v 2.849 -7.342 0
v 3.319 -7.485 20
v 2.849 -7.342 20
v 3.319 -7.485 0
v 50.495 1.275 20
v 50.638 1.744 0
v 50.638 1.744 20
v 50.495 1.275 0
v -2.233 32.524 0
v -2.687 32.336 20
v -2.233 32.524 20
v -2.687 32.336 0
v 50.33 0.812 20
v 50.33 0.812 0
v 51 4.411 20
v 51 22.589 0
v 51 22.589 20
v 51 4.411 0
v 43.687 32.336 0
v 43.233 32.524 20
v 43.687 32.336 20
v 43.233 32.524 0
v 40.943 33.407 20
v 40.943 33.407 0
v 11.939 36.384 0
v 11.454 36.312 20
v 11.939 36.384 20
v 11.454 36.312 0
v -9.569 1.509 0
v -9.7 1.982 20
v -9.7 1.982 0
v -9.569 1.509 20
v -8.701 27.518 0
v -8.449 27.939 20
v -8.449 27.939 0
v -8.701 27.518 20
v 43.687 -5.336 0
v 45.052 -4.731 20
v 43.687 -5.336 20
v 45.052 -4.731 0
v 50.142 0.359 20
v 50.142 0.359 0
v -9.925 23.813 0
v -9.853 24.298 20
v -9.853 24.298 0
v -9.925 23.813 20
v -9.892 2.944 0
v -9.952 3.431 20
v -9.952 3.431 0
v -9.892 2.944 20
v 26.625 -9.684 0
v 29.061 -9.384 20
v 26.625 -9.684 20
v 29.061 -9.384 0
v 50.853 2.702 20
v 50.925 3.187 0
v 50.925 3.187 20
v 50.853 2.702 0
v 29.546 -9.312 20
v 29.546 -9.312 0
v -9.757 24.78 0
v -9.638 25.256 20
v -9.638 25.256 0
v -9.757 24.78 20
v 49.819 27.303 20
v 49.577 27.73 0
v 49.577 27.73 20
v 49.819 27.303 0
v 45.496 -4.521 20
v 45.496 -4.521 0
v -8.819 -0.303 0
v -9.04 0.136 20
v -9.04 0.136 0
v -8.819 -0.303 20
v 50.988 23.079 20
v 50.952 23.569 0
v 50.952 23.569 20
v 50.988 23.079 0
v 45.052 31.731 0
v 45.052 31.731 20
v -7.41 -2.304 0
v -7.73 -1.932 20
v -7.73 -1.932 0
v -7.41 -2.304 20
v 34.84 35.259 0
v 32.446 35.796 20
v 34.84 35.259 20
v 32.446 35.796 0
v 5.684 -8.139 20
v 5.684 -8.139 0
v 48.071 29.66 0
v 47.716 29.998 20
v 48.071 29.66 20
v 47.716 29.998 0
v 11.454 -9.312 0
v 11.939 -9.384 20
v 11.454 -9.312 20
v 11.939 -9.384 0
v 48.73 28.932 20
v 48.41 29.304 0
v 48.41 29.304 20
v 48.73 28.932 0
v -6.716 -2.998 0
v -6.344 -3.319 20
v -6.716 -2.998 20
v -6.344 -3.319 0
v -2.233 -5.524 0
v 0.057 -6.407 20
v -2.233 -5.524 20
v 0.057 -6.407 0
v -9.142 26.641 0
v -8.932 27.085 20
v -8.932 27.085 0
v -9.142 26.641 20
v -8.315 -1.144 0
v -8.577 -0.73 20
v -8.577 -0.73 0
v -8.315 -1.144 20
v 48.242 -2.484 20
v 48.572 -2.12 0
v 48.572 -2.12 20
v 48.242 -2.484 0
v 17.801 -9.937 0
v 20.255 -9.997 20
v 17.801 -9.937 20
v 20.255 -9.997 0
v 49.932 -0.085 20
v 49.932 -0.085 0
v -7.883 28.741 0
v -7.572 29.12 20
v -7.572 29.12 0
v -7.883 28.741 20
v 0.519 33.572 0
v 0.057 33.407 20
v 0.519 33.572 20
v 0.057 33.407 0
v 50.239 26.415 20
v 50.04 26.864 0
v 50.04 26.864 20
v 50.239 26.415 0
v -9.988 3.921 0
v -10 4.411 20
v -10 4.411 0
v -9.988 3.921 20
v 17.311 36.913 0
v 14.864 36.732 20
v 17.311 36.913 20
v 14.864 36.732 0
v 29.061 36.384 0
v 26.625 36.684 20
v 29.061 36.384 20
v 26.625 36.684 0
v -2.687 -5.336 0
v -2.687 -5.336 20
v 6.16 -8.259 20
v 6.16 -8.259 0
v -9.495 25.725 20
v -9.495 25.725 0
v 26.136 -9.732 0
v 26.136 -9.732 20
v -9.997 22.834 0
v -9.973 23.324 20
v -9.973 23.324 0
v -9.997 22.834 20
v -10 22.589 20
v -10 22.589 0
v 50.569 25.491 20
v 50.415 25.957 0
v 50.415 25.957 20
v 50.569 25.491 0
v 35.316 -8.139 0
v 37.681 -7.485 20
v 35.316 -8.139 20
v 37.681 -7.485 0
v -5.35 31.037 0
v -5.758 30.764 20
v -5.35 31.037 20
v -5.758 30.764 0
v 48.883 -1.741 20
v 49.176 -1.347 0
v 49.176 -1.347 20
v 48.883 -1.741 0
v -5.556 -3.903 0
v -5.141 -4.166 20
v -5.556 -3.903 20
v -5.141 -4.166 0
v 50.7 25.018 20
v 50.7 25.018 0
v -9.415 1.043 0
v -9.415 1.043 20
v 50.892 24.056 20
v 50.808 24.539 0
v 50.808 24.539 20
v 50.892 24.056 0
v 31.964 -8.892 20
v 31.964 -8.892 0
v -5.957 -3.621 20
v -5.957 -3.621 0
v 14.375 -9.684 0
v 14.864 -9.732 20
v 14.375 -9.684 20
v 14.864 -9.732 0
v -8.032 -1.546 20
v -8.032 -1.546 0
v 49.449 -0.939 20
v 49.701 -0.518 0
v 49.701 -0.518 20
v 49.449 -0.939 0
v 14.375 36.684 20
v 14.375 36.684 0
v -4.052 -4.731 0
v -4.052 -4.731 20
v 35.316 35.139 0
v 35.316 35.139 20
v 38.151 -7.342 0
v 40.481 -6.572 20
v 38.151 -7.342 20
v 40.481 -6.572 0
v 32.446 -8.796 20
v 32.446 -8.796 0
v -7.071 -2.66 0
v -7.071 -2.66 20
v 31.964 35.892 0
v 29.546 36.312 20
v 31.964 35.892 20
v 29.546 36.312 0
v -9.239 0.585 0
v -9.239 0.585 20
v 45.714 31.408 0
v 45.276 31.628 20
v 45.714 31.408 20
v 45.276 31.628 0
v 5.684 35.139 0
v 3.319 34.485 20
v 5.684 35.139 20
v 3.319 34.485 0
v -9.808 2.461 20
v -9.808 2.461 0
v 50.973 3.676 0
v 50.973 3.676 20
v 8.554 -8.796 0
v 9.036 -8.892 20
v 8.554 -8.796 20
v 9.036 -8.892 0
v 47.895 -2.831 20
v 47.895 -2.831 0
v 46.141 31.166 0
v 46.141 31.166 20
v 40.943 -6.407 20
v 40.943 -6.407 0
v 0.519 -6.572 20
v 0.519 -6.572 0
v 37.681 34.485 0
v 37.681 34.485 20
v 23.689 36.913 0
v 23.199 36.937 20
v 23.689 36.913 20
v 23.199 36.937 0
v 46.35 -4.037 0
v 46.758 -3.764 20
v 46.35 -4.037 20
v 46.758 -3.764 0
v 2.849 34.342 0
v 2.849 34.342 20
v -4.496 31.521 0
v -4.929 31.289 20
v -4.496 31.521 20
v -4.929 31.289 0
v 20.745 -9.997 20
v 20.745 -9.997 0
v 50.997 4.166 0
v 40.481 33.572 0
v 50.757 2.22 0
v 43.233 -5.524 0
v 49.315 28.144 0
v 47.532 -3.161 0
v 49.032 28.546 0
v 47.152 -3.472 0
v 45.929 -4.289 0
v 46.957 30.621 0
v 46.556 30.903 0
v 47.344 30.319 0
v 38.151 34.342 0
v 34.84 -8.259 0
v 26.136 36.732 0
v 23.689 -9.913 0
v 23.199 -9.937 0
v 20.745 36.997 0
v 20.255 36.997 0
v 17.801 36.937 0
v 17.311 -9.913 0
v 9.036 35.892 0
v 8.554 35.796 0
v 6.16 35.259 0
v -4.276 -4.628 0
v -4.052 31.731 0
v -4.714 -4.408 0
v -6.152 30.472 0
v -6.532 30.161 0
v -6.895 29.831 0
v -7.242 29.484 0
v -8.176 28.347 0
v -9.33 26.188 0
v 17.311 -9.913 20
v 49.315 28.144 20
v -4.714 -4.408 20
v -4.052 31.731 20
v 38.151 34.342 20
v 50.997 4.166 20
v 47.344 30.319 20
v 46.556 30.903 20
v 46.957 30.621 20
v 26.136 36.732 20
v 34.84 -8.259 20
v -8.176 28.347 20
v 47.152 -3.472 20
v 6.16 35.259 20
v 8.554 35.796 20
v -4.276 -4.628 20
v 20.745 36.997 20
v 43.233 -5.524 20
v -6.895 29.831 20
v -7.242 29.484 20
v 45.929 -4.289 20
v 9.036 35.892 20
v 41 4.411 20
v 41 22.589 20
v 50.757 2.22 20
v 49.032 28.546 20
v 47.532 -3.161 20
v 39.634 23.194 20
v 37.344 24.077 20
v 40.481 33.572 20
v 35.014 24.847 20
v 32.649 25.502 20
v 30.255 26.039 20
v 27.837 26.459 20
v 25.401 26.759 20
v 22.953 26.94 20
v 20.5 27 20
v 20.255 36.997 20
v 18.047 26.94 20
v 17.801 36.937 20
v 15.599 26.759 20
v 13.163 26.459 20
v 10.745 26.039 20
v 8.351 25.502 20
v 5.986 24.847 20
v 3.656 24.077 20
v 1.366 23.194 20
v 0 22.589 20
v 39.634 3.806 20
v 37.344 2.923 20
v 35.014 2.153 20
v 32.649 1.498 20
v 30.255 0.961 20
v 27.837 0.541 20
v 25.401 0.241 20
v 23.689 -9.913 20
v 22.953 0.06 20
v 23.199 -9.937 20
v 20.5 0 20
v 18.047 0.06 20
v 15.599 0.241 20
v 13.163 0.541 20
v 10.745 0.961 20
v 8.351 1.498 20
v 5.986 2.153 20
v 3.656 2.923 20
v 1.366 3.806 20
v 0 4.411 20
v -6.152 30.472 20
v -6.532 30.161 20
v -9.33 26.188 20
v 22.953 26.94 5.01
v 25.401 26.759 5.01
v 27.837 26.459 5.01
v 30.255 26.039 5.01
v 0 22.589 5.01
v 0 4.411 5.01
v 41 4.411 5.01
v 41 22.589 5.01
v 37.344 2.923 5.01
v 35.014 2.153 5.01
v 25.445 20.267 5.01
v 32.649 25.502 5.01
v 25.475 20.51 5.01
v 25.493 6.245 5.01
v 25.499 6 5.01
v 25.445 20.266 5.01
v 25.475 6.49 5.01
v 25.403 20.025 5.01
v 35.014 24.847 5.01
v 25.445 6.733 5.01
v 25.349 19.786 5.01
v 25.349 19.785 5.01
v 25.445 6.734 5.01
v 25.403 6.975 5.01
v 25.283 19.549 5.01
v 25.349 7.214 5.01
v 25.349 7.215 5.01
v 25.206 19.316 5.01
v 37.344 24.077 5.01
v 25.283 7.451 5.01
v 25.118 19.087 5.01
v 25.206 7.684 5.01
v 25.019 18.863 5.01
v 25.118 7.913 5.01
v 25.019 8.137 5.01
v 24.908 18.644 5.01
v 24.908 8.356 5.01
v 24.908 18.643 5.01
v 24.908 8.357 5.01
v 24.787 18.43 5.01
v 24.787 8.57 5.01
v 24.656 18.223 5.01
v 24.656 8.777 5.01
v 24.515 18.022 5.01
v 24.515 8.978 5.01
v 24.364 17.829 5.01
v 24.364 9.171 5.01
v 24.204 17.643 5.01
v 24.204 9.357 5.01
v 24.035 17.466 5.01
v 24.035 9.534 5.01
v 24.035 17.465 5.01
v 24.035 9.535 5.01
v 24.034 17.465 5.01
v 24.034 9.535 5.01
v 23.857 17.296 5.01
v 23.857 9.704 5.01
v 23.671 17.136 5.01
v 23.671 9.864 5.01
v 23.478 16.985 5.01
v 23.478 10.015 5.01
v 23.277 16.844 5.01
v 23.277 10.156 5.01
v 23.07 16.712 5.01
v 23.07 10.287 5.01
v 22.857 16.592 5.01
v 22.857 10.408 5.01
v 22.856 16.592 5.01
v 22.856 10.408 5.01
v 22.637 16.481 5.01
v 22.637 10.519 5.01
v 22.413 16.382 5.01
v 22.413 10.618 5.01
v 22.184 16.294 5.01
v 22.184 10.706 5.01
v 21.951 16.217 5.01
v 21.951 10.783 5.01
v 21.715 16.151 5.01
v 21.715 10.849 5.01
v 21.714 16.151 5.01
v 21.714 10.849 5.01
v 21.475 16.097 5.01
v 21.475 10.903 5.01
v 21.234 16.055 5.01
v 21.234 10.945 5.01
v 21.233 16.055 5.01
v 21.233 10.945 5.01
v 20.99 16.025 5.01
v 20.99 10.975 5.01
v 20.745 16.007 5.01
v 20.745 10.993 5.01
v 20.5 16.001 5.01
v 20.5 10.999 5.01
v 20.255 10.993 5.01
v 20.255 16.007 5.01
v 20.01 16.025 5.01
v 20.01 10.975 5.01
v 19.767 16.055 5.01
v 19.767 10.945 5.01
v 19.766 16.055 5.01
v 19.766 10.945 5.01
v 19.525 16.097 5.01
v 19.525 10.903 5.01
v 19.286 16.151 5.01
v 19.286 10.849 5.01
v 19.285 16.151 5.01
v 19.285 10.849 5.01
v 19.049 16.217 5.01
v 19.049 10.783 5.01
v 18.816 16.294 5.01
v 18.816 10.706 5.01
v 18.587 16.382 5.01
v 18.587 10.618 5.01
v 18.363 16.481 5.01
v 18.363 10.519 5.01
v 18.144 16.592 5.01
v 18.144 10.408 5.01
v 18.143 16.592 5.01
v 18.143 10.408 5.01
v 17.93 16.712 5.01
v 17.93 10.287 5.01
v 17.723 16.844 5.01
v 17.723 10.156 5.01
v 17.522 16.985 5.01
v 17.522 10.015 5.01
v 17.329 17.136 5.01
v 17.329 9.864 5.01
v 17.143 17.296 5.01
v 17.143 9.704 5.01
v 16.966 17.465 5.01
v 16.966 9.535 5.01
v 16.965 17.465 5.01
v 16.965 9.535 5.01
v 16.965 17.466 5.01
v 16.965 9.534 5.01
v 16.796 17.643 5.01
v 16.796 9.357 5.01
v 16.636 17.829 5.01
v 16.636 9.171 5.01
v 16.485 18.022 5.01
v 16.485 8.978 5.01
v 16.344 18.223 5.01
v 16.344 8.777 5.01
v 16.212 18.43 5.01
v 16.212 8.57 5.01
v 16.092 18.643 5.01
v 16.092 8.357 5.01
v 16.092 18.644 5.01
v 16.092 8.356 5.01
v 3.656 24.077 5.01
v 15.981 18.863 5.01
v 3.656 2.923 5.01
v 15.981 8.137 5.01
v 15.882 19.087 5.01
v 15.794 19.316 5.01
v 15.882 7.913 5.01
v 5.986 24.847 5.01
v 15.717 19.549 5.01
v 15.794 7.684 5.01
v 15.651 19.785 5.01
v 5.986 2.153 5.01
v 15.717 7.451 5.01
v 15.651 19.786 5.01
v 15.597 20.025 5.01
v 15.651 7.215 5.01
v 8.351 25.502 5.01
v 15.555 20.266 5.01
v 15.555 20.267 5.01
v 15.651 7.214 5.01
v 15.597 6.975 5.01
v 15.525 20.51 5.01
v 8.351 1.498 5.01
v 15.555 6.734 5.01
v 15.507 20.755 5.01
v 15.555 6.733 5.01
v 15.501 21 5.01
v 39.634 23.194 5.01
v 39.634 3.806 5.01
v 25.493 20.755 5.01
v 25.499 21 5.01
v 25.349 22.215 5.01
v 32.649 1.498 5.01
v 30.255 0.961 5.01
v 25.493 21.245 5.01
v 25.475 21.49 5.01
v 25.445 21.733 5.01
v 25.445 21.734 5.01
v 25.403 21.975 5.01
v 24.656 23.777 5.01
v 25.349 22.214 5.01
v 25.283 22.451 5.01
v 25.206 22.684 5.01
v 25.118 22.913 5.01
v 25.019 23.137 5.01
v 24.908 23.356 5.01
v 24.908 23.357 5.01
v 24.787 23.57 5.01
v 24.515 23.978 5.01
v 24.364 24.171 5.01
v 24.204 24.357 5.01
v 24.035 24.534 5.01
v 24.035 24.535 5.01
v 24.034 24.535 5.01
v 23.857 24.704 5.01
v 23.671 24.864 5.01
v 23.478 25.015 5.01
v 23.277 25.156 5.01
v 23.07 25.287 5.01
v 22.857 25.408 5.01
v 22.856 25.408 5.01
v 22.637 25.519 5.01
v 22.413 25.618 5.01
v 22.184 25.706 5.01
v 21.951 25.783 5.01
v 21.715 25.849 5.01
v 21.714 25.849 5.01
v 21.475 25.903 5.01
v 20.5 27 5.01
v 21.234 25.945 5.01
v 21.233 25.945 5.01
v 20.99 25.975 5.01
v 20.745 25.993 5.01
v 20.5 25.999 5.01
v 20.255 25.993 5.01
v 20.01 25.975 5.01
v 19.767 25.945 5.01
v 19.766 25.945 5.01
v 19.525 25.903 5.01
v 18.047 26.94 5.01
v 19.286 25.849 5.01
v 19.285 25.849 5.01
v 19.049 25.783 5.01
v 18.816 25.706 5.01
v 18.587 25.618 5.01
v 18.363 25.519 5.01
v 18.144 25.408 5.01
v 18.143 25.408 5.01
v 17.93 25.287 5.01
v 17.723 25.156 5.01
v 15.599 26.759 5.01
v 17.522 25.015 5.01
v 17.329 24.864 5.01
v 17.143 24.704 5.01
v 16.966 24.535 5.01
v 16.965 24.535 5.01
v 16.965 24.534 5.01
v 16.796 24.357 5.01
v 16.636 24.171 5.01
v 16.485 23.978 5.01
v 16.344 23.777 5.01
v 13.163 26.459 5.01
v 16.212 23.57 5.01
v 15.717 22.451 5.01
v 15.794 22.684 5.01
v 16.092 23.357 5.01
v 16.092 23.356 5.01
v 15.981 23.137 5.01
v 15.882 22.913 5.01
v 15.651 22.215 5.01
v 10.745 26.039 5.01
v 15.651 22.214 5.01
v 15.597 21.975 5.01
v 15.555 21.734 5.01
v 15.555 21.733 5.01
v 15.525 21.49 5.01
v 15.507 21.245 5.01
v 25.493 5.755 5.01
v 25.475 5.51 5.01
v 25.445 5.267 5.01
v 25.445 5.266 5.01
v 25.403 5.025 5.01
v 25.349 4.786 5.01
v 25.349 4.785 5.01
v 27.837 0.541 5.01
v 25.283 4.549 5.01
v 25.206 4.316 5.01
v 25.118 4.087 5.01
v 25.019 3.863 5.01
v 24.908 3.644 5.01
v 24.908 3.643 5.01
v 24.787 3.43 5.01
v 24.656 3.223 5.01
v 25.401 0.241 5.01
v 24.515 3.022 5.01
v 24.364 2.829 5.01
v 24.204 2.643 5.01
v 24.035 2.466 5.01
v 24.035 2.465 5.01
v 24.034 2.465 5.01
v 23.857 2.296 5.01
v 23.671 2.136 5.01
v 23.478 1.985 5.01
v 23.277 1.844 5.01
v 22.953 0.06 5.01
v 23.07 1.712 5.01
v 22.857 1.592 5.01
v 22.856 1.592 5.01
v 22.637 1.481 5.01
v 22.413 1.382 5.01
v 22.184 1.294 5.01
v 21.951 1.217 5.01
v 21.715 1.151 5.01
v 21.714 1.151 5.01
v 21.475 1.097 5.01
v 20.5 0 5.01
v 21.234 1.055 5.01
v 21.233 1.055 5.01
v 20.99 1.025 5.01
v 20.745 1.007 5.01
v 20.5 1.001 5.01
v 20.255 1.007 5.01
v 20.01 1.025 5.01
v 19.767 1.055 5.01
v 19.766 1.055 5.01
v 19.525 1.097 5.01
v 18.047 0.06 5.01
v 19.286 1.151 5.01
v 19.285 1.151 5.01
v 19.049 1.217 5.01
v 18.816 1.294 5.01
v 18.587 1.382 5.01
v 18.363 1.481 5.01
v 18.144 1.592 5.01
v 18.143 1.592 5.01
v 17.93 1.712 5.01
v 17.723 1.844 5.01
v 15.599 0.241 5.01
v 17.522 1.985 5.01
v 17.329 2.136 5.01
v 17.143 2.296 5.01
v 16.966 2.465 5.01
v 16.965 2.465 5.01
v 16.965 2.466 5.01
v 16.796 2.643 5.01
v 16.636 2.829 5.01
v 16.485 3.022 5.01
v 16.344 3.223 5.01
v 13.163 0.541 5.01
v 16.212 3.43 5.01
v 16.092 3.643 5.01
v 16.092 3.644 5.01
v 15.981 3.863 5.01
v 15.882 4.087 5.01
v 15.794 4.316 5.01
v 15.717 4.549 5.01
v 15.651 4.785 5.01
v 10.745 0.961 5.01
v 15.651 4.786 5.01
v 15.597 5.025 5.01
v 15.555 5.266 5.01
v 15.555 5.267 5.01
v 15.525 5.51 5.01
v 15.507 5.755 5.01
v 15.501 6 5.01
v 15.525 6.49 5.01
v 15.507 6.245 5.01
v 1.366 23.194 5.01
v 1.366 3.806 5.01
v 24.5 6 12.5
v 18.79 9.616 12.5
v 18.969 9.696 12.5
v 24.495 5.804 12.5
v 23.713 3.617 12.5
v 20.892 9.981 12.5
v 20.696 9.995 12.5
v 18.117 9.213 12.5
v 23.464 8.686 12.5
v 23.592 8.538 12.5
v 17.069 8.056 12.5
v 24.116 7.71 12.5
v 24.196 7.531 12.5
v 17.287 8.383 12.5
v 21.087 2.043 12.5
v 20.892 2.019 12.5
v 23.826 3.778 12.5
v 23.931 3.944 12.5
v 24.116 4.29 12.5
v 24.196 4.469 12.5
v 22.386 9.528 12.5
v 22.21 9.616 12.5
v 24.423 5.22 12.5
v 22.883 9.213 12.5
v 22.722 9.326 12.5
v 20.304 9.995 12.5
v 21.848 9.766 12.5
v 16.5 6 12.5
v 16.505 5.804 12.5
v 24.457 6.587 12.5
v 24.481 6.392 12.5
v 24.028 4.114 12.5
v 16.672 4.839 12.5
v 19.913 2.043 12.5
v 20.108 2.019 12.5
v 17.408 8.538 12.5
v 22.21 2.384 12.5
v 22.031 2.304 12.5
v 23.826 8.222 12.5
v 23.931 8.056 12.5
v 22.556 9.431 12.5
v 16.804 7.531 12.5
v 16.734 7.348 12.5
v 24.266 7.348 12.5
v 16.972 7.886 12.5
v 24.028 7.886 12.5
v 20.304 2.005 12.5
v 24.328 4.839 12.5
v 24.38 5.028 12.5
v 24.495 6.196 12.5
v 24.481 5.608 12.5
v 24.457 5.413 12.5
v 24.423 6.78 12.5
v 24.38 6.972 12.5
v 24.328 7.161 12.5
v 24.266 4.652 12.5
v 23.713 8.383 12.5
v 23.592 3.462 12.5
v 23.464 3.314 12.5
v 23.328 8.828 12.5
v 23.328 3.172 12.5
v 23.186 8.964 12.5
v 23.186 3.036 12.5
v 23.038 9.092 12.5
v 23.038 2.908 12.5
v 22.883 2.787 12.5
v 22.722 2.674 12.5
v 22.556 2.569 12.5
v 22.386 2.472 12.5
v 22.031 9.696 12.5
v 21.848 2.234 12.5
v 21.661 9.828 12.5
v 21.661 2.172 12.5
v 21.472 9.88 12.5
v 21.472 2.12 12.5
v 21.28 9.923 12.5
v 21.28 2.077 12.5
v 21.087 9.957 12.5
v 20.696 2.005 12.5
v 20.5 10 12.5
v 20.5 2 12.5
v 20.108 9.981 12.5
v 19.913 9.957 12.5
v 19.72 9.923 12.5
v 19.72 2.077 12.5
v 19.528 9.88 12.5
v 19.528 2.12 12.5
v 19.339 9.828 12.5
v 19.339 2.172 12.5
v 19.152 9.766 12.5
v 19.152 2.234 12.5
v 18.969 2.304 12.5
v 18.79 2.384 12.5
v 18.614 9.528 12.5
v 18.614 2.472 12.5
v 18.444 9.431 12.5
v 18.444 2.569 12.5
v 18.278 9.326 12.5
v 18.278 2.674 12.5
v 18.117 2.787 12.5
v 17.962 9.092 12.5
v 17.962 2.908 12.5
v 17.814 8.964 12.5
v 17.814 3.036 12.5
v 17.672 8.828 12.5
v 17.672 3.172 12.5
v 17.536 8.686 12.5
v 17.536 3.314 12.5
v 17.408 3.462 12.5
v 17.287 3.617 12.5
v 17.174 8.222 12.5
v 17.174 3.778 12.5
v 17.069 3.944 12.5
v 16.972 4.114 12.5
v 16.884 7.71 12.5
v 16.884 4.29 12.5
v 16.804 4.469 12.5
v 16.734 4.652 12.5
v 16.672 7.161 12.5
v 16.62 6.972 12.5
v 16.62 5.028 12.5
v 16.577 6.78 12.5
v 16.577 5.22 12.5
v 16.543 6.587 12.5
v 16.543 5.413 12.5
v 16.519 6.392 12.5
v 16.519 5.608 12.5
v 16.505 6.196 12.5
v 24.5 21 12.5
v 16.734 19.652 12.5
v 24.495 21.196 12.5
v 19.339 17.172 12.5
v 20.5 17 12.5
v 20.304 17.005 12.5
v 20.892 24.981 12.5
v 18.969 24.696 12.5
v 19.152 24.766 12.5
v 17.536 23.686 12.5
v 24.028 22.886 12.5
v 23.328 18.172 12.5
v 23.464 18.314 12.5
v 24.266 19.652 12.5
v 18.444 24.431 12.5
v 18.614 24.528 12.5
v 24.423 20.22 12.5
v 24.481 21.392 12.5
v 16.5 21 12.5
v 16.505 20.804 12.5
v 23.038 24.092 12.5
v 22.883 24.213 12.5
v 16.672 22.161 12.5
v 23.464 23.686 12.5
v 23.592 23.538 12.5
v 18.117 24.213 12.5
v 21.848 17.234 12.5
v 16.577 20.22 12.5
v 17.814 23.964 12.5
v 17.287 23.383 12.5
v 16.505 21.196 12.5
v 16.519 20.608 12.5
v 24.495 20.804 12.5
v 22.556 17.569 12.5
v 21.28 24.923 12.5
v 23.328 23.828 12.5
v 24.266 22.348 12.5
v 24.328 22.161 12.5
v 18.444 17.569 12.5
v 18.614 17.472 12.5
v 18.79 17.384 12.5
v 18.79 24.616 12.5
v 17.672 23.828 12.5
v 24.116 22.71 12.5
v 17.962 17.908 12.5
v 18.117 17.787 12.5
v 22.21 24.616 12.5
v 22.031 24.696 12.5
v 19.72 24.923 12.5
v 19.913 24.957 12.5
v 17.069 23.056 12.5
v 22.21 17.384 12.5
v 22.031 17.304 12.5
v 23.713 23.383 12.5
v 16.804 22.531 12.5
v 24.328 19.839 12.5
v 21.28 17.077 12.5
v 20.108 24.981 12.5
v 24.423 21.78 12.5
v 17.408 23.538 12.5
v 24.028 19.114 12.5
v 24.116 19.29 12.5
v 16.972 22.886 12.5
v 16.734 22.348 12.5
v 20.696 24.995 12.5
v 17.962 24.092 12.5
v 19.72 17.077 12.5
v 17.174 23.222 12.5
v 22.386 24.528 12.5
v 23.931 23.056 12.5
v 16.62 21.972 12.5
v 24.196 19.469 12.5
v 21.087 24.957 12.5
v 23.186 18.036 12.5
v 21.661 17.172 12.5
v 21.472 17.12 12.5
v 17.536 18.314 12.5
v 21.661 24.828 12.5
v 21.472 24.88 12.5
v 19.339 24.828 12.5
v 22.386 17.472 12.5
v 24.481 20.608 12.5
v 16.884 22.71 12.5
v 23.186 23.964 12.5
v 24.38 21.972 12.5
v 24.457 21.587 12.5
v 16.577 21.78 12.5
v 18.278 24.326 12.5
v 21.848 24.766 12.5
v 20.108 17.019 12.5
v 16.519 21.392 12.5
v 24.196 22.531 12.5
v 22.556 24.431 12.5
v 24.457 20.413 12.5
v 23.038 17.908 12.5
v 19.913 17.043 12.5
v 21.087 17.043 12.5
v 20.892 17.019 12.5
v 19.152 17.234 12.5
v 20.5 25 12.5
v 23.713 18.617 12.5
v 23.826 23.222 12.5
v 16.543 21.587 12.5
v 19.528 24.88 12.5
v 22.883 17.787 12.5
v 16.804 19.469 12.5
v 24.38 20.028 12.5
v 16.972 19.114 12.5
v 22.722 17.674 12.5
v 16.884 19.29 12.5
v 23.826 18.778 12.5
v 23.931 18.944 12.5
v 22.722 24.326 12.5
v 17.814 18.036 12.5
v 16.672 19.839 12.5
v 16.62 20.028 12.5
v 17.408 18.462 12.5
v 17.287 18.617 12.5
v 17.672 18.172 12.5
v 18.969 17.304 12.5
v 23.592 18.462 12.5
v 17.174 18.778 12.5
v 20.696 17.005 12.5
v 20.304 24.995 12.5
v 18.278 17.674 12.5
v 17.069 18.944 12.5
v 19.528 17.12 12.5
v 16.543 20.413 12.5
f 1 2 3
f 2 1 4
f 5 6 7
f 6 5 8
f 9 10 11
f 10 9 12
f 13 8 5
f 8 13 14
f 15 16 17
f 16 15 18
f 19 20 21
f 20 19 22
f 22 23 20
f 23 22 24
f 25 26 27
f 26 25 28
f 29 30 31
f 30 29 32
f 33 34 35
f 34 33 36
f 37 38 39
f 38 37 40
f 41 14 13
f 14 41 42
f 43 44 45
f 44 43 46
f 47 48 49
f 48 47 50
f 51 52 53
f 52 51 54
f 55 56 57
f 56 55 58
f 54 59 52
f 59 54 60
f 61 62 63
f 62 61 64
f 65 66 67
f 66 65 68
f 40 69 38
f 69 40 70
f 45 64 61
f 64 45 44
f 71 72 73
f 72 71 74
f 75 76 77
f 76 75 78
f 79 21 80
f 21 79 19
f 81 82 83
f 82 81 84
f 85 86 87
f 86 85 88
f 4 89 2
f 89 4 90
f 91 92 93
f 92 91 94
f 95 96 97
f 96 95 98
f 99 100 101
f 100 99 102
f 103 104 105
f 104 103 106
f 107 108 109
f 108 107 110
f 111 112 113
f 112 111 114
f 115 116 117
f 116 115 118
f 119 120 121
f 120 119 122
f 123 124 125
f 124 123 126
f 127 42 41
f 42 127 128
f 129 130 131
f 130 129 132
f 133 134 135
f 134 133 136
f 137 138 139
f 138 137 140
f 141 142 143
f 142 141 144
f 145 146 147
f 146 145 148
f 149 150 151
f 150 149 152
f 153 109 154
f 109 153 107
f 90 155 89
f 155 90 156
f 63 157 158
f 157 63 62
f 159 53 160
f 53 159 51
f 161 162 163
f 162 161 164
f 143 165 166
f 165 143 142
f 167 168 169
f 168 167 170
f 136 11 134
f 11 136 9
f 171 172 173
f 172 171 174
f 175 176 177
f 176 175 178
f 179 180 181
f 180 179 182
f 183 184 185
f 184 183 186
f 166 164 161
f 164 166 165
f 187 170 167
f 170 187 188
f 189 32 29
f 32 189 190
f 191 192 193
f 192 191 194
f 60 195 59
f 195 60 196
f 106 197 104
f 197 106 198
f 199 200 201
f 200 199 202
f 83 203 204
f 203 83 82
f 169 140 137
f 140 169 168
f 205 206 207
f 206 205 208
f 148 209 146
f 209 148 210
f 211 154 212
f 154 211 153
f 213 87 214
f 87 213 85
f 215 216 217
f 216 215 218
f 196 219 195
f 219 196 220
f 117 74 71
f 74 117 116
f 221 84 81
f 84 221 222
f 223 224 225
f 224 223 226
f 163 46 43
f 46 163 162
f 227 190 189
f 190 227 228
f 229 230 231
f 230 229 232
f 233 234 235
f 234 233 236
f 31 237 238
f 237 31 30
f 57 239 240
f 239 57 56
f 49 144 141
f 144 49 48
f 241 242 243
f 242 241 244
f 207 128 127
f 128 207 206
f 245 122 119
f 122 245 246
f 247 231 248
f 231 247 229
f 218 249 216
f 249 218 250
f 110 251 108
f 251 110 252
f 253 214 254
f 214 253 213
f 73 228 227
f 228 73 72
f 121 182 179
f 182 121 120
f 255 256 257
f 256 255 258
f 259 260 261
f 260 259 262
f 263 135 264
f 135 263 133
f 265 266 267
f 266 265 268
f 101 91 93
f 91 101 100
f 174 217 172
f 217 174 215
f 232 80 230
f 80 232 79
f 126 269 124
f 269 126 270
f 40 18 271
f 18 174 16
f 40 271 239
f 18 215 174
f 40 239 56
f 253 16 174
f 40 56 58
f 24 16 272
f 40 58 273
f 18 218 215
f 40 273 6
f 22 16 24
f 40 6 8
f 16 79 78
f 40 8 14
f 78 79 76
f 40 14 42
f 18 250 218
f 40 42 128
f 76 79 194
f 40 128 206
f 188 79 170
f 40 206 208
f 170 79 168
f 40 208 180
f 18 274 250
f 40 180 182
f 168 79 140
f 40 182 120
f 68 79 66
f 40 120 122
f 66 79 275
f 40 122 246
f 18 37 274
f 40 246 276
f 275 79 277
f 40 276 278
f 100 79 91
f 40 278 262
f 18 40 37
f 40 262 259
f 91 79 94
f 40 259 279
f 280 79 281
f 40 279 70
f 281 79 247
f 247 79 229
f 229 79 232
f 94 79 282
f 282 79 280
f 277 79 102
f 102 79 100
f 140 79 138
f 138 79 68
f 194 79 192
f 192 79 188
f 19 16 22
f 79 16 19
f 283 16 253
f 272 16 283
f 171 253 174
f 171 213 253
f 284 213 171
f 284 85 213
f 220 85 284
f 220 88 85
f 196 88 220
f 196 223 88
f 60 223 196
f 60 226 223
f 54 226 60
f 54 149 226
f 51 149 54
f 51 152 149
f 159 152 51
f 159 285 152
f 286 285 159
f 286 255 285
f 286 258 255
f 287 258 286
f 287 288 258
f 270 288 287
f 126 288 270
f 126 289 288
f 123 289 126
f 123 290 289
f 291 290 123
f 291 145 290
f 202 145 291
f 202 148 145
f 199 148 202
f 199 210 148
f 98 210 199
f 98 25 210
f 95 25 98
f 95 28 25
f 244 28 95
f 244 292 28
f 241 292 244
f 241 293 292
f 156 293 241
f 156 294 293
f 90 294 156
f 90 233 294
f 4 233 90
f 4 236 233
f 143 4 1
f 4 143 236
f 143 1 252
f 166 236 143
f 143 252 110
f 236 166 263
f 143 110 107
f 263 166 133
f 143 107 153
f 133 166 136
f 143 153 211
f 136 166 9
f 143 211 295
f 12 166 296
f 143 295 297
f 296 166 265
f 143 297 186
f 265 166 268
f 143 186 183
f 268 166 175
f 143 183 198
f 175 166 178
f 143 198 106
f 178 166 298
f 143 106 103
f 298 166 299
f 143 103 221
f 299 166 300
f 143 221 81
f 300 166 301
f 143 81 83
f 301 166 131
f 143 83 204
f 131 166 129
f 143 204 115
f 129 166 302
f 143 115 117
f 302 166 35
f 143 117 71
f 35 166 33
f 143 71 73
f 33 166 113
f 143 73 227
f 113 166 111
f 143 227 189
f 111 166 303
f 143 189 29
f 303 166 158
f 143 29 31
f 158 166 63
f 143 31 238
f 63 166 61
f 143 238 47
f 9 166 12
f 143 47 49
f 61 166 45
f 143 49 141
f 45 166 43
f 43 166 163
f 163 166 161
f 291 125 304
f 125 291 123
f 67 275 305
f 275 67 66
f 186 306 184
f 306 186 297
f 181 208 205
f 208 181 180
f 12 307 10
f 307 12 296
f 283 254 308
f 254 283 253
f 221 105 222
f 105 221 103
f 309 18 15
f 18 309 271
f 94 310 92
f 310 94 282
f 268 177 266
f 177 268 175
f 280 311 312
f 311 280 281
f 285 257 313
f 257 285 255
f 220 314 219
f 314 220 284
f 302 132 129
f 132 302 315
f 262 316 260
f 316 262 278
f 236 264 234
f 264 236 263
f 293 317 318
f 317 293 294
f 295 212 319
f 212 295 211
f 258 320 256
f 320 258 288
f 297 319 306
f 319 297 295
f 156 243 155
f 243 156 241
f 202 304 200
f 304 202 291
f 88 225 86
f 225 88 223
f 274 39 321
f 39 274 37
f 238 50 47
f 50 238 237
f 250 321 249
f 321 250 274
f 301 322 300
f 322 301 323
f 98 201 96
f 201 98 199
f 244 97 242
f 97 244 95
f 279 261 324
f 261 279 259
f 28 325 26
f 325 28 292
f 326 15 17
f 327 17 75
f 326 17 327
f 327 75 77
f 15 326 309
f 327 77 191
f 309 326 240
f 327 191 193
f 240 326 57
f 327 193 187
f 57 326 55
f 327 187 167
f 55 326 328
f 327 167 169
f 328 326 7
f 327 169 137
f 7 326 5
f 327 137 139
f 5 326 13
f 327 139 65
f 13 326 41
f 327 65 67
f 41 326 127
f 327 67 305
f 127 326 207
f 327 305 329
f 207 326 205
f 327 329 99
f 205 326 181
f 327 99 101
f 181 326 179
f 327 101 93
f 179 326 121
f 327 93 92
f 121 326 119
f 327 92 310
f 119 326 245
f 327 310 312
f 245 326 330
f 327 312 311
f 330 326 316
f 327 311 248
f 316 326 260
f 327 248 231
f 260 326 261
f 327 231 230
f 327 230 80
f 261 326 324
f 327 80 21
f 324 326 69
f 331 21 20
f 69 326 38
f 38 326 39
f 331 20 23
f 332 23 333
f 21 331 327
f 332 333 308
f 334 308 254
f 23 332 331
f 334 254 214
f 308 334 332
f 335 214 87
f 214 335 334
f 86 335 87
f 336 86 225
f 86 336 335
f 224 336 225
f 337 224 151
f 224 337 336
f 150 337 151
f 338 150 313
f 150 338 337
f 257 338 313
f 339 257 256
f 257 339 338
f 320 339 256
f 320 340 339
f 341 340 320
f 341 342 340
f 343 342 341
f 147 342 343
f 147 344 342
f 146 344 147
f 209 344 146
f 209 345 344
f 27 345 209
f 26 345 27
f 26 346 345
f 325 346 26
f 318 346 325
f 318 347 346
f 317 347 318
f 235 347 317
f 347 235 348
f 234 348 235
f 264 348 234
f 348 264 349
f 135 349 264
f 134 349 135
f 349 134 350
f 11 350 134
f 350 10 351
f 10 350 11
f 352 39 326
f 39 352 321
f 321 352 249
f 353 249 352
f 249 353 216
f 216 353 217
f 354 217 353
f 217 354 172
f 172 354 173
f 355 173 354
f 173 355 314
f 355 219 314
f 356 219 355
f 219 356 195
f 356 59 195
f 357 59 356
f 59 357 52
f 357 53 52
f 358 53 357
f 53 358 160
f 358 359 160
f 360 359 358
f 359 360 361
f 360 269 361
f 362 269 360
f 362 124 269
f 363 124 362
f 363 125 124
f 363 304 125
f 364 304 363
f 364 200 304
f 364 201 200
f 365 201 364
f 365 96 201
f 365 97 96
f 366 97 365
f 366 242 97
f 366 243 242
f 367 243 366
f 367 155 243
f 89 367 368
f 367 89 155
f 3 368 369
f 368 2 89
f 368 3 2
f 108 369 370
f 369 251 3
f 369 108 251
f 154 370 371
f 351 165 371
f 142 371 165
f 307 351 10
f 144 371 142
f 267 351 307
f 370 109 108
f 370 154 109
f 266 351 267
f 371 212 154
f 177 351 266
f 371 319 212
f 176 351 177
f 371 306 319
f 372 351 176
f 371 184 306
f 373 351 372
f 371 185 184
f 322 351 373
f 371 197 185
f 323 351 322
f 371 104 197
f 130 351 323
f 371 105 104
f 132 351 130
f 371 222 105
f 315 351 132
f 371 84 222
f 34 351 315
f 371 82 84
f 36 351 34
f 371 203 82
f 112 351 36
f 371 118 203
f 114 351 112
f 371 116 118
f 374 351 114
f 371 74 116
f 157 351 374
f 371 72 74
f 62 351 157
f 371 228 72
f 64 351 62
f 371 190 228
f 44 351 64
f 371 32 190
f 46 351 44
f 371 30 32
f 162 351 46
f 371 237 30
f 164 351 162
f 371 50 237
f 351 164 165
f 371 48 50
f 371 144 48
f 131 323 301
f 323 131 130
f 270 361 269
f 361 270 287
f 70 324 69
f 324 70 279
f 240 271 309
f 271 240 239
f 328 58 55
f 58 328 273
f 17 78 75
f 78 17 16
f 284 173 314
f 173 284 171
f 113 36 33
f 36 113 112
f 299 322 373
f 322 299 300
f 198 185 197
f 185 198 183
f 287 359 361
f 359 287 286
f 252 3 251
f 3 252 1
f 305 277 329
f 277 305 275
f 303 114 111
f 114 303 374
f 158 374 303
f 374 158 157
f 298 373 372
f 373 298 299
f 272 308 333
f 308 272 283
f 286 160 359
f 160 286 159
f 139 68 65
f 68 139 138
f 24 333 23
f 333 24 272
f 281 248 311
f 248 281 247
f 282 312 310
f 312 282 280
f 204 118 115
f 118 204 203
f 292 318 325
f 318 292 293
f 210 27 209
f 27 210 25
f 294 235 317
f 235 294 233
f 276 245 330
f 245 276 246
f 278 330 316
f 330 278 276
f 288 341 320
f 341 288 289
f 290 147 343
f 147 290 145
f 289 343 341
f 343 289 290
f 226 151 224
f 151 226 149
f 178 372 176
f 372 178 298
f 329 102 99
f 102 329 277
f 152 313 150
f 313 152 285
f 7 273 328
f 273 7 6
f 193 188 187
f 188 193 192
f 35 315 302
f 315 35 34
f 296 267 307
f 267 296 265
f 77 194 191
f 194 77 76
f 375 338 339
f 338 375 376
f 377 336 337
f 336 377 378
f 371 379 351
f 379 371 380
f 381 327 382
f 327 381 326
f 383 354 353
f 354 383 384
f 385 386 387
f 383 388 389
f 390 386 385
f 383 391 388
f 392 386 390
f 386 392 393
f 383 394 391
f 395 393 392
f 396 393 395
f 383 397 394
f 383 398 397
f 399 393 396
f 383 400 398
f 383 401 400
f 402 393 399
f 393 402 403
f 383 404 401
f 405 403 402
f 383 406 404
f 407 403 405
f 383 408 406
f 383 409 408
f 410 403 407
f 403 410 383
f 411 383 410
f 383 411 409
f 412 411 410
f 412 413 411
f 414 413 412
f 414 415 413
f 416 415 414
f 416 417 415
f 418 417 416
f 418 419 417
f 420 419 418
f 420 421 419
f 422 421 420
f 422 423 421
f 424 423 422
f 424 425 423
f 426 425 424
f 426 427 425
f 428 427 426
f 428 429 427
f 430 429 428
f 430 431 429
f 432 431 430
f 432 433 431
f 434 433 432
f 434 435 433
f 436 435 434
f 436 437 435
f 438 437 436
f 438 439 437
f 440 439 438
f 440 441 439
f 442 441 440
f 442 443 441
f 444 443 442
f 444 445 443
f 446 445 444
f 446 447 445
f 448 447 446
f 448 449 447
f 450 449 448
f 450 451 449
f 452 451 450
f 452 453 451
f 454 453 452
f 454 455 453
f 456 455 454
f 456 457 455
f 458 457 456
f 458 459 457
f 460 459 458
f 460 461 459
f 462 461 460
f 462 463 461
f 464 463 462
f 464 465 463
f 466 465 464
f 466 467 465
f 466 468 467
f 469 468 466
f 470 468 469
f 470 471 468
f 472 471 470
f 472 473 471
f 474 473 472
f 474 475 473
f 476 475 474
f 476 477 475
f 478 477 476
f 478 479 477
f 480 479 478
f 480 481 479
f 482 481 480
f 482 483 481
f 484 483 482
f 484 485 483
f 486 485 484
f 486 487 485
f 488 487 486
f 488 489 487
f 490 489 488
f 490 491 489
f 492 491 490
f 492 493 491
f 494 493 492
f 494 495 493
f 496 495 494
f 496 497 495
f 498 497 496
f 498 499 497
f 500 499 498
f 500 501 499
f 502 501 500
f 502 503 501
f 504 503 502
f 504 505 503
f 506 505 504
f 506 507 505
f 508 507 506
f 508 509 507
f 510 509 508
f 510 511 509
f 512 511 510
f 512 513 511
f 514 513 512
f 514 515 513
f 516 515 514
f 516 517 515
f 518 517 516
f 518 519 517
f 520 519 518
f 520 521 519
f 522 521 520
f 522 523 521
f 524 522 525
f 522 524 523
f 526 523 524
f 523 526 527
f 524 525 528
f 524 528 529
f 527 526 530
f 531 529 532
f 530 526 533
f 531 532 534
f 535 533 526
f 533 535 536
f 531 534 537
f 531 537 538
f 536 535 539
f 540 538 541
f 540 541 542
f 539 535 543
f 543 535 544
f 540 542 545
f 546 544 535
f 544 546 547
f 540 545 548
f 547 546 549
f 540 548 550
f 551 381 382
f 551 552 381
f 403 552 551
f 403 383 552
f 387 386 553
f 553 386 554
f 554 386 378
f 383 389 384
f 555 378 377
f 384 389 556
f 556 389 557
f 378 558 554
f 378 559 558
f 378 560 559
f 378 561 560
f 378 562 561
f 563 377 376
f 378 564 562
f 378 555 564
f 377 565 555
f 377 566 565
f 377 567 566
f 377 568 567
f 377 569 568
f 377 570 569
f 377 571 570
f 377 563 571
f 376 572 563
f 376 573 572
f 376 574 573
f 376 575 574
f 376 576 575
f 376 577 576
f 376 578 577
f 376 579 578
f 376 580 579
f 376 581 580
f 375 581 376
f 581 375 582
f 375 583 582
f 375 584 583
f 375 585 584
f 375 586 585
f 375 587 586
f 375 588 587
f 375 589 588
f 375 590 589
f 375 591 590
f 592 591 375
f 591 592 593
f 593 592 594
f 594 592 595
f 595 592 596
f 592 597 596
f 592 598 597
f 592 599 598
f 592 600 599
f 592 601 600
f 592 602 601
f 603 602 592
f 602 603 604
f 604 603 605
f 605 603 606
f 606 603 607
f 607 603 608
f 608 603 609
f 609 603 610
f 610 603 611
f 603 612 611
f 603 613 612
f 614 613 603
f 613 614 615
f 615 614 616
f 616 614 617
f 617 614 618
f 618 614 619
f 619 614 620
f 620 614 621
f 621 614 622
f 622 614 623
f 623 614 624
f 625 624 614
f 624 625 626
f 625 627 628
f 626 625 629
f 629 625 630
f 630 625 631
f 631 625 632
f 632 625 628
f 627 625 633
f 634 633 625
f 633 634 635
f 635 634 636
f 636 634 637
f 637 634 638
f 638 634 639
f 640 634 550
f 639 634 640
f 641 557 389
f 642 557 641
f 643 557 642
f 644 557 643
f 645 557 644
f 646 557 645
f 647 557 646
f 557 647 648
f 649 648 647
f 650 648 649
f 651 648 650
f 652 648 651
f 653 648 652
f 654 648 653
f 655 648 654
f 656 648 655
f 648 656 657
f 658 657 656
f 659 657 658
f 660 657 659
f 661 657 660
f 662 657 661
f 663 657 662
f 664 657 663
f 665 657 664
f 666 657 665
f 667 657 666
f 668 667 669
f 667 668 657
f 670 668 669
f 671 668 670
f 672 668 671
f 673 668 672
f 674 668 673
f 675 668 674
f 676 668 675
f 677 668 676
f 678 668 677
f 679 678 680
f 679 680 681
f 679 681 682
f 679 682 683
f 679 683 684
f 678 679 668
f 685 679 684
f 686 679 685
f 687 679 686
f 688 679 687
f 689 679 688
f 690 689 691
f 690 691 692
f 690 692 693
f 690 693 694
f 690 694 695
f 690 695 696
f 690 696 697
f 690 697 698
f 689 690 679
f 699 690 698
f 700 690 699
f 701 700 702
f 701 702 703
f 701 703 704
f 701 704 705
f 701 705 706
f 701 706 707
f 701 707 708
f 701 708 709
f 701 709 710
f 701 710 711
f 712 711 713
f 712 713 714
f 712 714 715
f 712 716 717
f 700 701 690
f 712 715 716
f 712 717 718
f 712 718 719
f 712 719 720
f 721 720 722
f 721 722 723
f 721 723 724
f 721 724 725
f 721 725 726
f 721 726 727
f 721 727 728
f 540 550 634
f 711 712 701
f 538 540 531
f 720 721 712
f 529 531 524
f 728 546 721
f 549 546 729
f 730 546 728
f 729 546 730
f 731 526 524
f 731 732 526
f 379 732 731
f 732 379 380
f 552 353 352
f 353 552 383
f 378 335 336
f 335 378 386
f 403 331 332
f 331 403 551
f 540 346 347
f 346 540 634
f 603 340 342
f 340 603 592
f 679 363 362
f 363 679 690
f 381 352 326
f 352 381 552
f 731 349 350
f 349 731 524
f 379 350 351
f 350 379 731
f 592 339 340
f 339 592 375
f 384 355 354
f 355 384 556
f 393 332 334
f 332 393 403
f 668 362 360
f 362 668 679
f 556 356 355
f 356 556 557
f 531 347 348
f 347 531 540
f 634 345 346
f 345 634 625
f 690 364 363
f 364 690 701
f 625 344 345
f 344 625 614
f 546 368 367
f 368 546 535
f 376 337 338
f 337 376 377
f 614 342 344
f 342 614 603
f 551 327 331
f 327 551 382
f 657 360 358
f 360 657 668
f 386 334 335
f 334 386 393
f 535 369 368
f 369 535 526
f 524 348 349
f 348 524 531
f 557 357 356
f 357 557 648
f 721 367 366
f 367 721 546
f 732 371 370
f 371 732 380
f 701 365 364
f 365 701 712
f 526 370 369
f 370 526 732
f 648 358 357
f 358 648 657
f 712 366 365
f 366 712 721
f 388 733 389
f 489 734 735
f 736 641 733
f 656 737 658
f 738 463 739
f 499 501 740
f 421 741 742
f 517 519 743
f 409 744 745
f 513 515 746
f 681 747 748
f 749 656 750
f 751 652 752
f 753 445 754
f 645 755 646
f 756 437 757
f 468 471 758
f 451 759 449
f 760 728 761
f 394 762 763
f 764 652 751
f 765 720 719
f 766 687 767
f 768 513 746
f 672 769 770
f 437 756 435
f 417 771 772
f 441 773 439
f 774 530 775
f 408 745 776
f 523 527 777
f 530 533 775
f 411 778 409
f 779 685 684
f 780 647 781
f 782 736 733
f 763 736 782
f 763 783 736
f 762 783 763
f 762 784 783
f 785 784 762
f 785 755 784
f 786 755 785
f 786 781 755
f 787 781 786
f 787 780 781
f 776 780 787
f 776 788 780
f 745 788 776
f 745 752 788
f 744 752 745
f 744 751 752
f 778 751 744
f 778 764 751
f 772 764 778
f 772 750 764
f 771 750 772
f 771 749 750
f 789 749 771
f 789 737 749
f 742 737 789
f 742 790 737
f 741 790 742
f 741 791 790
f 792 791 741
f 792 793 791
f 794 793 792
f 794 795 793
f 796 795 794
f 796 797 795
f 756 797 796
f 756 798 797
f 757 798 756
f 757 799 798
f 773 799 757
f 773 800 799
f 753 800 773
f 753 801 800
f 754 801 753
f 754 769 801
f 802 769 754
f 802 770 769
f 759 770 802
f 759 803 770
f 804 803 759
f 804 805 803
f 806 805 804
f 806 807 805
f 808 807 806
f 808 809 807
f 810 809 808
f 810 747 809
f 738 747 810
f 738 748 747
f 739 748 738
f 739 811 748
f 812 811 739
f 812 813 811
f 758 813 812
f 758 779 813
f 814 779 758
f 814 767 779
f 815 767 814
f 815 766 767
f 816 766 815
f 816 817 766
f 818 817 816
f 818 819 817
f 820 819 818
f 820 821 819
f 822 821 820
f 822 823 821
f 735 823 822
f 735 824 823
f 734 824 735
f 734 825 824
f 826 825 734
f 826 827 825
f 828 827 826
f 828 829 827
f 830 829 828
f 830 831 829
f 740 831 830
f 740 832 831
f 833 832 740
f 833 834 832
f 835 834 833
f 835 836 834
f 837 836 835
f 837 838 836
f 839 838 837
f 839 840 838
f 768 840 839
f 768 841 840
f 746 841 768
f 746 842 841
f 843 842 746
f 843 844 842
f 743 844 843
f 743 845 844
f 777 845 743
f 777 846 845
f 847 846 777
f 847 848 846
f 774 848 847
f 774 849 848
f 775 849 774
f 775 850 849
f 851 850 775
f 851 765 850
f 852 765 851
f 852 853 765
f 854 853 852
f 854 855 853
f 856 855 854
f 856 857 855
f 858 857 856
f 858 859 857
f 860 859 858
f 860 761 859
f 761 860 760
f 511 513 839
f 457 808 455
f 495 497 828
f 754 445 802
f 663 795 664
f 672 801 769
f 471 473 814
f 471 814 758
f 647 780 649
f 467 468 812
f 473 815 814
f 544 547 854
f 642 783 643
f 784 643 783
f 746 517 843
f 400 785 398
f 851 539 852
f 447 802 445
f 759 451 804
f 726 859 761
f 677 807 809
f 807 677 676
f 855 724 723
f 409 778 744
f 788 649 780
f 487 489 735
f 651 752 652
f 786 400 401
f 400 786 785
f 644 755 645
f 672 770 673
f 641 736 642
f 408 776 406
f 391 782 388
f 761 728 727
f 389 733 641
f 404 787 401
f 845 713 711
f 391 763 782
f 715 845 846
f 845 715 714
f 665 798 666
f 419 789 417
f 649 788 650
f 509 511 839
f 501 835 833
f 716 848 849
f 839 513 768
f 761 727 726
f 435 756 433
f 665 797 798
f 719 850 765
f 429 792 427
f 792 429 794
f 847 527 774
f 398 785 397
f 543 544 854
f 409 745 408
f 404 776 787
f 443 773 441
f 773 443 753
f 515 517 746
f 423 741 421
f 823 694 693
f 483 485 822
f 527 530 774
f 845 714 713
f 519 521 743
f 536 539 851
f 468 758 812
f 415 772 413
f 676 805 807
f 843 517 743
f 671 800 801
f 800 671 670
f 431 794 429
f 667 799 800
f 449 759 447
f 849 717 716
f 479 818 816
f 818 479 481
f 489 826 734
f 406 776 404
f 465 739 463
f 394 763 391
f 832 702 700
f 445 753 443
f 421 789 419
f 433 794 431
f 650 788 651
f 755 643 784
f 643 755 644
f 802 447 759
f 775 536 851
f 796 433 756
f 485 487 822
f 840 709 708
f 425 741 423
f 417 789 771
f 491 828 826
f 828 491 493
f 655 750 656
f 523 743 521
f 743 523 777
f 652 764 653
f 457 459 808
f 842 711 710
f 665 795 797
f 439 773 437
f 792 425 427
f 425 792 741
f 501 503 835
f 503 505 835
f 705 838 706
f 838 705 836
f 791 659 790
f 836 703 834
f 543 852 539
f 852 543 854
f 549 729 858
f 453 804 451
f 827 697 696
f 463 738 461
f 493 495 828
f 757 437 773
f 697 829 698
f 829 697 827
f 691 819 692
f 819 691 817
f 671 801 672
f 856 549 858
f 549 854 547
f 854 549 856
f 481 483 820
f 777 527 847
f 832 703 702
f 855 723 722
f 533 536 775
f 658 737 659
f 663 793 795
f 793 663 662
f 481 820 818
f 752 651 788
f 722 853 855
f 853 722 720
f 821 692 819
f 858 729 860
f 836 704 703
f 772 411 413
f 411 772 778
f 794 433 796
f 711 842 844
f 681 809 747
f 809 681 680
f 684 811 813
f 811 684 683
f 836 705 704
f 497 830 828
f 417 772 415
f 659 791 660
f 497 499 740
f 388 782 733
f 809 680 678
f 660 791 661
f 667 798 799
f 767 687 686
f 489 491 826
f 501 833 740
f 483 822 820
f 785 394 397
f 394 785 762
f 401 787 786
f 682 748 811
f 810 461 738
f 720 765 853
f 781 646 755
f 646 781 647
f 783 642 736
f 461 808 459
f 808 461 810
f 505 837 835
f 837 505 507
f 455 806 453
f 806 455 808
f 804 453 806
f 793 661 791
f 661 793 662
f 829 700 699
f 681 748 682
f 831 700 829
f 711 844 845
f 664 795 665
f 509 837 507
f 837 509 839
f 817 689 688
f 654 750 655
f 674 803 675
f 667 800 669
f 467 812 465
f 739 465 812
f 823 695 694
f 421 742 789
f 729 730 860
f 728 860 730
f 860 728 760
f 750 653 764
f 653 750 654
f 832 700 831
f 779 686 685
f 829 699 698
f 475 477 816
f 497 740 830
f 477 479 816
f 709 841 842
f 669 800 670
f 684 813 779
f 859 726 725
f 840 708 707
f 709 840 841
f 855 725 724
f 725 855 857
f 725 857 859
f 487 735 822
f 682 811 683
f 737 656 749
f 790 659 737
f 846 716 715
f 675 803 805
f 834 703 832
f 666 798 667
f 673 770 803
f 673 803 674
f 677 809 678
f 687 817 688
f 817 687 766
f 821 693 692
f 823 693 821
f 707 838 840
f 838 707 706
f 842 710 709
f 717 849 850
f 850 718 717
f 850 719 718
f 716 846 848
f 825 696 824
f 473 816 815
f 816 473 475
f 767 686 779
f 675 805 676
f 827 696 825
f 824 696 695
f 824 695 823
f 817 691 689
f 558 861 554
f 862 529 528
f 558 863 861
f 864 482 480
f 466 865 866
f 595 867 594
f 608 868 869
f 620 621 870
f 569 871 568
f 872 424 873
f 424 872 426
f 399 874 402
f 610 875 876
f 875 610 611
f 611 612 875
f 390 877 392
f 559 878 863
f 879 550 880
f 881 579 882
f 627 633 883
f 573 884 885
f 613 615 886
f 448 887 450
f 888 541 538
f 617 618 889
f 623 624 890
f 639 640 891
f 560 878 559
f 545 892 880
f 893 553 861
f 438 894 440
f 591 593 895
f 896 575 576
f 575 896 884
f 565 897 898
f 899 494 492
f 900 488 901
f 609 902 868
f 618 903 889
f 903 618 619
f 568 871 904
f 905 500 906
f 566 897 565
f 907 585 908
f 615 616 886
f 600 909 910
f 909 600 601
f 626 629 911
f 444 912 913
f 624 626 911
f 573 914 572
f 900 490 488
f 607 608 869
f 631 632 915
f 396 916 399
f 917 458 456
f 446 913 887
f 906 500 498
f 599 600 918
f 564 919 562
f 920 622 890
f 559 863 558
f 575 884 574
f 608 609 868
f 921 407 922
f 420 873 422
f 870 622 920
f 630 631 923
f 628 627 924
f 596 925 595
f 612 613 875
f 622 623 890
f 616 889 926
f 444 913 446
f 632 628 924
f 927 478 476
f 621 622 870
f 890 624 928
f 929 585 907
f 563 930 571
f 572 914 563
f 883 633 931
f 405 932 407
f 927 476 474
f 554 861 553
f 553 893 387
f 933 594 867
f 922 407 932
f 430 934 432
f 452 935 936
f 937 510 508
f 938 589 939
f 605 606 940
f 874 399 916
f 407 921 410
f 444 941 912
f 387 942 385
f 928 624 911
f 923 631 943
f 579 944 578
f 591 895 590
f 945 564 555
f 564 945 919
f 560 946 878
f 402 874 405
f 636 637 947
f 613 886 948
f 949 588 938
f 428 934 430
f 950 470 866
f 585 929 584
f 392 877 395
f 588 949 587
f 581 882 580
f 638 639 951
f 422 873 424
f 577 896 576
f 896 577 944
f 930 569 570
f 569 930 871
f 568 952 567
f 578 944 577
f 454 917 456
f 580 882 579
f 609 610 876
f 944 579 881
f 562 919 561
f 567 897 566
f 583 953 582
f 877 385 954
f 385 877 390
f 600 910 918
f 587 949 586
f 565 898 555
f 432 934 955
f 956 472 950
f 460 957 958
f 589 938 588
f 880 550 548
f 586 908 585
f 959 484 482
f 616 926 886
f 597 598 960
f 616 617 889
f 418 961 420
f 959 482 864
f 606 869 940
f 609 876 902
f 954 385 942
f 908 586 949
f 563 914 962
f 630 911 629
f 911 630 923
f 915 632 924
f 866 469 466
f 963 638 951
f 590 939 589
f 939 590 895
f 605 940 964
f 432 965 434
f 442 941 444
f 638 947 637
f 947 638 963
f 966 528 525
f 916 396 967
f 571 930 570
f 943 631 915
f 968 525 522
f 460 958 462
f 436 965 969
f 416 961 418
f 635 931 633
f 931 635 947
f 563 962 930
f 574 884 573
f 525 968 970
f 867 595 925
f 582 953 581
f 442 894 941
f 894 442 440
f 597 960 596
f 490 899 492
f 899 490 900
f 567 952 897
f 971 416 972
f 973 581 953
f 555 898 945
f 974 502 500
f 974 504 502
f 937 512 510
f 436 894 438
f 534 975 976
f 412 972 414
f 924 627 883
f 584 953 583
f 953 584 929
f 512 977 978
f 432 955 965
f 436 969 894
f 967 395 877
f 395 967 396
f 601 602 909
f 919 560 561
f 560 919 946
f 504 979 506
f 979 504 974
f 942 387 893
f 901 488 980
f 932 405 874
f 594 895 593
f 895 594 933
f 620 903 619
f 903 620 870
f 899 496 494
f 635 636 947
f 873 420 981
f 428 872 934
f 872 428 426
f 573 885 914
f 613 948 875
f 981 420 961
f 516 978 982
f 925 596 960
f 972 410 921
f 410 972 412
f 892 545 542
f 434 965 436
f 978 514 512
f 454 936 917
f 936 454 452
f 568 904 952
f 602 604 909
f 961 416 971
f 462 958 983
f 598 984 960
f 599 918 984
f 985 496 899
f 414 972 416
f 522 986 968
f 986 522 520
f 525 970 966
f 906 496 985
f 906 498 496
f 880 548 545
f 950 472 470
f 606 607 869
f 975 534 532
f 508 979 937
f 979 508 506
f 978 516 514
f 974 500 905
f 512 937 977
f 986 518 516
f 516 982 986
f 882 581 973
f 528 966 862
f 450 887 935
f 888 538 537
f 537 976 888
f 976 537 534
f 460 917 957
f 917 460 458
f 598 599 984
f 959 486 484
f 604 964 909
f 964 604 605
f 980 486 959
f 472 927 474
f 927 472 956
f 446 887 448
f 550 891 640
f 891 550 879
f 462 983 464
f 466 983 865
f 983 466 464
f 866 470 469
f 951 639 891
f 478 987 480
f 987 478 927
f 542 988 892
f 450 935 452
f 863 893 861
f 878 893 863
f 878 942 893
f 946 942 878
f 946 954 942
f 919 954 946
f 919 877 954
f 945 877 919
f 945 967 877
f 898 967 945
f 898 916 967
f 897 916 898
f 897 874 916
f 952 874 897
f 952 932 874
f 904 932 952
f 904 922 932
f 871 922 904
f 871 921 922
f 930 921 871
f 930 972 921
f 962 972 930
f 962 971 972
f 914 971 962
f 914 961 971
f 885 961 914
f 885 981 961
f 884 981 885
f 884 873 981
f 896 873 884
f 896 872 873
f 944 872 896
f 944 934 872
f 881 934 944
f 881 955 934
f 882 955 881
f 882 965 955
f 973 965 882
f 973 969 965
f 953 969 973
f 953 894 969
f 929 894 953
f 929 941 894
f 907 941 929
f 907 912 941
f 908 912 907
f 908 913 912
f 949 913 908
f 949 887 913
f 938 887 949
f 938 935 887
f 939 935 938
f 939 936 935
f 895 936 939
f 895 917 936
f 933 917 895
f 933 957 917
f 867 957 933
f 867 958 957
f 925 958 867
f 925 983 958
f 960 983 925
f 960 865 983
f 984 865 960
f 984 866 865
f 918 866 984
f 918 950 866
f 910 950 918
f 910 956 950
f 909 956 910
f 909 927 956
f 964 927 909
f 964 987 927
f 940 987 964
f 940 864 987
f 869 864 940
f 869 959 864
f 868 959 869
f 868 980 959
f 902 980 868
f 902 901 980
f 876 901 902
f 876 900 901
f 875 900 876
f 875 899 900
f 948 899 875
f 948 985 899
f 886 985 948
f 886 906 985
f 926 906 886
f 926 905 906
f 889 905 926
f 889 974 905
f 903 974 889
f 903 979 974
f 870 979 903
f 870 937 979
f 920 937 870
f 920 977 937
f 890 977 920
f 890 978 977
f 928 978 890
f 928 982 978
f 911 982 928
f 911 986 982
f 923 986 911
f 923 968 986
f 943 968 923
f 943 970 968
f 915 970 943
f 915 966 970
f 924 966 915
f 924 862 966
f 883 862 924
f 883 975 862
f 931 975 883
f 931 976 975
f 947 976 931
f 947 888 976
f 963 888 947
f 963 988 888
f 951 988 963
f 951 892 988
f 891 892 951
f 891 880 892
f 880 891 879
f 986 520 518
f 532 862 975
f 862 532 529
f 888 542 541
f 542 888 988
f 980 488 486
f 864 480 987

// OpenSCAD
stickBB = [41, 27];
stickThickness = 1;
stickLongRadius = 50;

growth = 10;
insetHeight = 15;
bottomHeight = 5; // TODO: match with reality?

holderR = 5;

$fn = $preview ? 64 : 128;

module foot() {
    difference() {
        linear_extrude(bottomHeight + insetHeight)
        offset(growth)
        outerFit();
        
        translate([0, 0, bottomHeight + 0.01])
        linear_extrude(insetHeight)
        outerFit();
    }
    
    translate([stickBB.x / 2, stickThickness + holderR, bottomHeight])
    holder();
    
    translate([stickBB.x / 2, stickBB.y - (stickThickness + holderR), bottomHeight])
    holder();
}

module outerFit() {
    intersection() {
        square(stickBB);
        
        translate([stickBB.x / 2, stickBB.y - stickLongRadius])
        circle(r = stickLongRadius);
        
        translate([stickBB.x / 2, stickLongRadius])
        circle(r = stickLongRadius);
    }
}

module holder() {
    cylinder(r1 = holderR, r2 = holderR - 1, h = insetHeight / 2);
}

foot();
